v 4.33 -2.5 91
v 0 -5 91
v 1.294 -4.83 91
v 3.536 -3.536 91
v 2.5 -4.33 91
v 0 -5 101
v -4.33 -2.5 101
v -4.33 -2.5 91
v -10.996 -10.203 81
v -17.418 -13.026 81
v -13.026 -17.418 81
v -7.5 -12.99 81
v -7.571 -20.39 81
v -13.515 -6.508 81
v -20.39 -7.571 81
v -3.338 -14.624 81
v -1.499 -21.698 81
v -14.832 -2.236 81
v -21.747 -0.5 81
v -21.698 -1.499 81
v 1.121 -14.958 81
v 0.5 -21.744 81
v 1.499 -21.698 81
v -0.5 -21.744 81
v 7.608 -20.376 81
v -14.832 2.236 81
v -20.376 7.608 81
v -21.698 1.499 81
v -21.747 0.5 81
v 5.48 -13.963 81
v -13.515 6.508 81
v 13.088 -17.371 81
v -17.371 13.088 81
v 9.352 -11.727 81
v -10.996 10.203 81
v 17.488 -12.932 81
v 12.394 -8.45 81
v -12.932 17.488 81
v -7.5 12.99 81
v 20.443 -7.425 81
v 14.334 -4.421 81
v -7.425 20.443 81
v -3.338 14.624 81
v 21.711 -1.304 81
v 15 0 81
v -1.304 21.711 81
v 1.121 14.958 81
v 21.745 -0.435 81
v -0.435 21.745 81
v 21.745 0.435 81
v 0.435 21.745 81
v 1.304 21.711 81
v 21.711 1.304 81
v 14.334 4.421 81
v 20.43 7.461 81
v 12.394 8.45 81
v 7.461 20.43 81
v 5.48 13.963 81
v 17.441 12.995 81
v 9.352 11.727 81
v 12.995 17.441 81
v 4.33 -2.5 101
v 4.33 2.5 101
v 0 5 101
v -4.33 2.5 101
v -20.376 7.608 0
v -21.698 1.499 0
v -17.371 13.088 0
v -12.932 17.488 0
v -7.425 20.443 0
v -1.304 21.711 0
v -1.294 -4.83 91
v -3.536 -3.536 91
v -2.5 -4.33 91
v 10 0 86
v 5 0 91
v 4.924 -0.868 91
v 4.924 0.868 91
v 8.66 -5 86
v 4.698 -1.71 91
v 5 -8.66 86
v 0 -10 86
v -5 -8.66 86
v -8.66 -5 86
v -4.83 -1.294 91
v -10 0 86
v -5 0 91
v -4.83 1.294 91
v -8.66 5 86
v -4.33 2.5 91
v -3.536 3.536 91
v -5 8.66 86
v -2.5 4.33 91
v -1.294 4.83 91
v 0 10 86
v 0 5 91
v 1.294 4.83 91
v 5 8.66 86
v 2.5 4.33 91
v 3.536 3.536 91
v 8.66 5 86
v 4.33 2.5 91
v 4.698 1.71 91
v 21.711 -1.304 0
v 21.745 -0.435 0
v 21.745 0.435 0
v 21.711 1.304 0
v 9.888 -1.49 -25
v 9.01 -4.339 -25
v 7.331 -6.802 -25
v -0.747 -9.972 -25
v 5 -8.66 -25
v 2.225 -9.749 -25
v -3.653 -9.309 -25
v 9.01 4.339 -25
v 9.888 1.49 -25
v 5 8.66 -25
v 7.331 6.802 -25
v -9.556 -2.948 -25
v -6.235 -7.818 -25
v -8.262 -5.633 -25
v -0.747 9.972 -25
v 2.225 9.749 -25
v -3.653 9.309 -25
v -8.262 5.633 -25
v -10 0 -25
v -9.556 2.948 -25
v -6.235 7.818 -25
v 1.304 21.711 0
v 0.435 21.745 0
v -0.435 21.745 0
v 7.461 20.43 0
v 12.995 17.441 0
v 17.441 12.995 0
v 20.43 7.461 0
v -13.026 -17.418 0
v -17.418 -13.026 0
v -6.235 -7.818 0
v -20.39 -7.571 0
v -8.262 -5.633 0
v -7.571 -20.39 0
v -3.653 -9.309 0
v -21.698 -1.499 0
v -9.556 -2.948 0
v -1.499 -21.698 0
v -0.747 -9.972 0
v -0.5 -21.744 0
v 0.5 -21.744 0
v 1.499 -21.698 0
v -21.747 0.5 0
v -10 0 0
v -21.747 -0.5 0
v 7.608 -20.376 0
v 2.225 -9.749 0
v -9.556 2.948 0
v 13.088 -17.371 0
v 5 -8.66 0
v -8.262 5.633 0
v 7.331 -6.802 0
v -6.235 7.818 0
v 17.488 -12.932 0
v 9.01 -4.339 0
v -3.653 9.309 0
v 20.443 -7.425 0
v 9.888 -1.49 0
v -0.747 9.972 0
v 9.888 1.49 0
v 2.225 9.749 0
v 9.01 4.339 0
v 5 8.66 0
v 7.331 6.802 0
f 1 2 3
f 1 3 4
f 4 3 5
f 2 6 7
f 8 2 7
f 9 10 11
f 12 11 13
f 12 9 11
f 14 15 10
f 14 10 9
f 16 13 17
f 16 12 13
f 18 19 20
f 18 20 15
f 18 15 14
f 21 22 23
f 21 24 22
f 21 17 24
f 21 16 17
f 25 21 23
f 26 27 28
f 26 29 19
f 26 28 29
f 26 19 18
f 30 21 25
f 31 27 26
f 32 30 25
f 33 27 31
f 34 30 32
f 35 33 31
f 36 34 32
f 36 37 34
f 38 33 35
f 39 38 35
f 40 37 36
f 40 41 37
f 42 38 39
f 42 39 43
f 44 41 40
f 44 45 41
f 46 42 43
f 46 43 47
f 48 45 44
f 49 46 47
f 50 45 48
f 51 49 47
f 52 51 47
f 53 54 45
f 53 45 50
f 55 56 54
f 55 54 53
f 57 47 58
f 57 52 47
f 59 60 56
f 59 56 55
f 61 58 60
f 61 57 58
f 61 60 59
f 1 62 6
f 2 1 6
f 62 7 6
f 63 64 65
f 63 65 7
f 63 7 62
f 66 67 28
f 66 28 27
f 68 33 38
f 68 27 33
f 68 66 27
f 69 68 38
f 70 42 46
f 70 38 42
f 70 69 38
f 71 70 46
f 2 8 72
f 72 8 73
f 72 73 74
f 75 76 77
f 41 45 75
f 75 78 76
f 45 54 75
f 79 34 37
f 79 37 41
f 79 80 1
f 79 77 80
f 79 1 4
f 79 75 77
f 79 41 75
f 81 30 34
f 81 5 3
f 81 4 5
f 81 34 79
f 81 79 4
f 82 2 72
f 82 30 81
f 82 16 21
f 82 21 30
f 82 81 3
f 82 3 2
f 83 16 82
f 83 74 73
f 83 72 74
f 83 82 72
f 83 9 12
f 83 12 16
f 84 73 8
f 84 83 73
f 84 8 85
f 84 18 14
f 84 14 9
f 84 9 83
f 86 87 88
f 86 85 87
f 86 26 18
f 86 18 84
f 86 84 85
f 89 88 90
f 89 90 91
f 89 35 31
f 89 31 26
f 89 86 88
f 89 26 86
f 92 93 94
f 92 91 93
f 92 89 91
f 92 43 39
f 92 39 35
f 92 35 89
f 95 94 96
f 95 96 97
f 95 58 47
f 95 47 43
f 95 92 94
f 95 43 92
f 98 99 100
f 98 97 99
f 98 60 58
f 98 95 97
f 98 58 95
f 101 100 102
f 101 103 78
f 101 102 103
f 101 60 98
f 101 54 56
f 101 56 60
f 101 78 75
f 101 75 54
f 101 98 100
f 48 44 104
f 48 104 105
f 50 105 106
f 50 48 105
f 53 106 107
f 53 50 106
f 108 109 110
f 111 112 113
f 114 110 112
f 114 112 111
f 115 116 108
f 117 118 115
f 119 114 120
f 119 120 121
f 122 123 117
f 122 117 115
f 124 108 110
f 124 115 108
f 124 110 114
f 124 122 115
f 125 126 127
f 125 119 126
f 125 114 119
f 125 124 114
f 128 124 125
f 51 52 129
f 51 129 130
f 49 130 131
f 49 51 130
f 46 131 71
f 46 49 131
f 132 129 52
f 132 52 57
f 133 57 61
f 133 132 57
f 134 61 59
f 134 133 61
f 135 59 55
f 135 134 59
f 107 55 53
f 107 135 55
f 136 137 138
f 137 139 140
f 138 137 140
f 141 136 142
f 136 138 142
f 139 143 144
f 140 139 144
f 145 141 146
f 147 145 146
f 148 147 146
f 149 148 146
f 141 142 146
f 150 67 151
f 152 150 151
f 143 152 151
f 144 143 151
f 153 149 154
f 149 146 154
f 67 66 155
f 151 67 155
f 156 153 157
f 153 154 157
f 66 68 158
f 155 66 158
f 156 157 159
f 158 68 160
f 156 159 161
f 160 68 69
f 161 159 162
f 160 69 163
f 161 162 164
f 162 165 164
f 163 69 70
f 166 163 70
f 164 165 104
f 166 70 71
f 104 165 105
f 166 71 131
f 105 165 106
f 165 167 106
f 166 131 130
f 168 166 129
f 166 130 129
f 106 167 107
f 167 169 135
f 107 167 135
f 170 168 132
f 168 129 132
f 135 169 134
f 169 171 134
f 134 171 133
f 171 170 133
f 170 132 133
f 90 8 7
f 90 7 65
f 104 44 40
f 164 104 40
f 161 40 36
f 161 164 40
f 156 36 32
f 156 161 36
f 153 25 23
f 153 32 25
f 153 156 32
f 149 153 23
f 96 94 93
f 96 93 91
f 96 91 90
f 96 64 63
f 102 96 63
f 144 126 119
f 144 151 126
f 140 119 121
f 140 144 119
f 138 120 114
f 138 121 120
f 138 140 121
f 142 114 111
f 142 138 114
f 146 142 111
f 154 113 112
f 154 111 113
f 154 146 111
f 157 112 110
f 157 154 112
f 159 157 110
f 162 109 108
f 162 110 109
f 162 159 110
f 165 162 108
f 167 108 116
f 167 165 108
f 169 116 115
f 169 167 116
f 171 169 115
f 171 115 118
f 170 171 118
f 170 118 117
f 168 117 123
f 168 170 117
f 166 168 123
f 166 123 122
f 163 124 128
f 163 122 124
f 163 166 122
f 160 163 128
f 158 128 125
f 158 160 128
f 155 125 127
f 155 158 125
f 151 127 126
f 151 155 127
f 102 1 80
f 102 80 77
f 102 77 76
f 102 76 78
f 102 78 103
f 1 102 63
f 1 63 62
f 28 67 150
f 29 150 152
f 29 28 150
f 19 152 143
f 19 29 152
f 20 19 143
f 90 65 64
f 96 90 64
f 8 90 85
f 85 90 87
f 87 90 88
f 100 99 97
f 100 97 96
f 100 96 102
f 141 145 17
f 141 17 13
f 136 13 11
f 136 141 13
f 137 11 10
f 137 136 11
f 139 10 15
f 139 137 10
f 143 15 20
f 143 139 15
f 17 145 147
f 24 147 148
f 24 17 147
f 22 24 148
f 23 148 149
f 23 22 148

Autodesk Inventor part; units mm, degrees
ref_plane "YZ Plane" through (0, 0, 0) normal (1, 0, 0) x (0, 1, 0)
ref_plane "XZ Plane" through (0, 0, 0) normal (0, 1, 0) x (-1, 0, 0)
ref_plane "XY Plane" through (0, 0, 0) normal (0, 0, 1) x (1, 0, 0)
sketch "Boceto1" plane through (0, 0, 0) normal (0, 0, 1) x (1, 0, 0)
  circle A0 centre (0, 0) radius 21.75
  arc A1 (1.304413, 21.71085) -> (0, 23.055) centre (0, 21.75) ccw
  arc A2 (0, 23.055) -> (-1.304413, 21.71085) centre (0, 21.75) ccw
  line L0 (0, -21.75) -> (0, -23.25)
  arc A3 (0, -23.25) -> (1.499108, -21.698276) centre (0, -21.75) ccw
  arc A4 (-1.499108, -21.698276) -> (0, -23.25) centre (0, -21.75) ccw
  line L1 (21.75, 0) -> (23.055, 0)
  line L2 (-21.75, 0) -> (-23.25, 0)
  arc A5 (-21.698276, 1.499108) -> (-21.698276, -1.499108) centre (-21.75, 0) ccw
  arc A6 (21.71085, -1.304413) -> (21.71085, 1.304413) centre (21.75, 0) ccw
  dimension "d0" = 43.5
  dimension "d2" = 1.5
  dimension "d4" = 1.5
extrude "Extrusión1" add sketch "Boceto1" along normal blind 81
sketch "Boceto2" plane through (0, 0, 81) normal (0, 0, 1) x (1, 0, 0)
  line L0 (0, 5) -> (4.330127, 2.5)
  line L1 (4.330127, 2.5) -> (4.330127, -2.5)
  line L2 (4.330127, -2.5) -> (0, -5)
  line L3 (0, -5) -> (-4.330127, -2.5)
  line L4 (-4.330127, -2.5) -> (-4.330127, 2.5)
  line L5 (-4.330127, 2.5) -> (0, 5)
  point P0 (0, 0)
  point P1 (0, 0)
extrude "Extrusión2" add sketch "Boceto2" along normal blind 20
sketch "Boceto10" plane through (0, 0, 0) normal (0, 0, -1) x (-1, 0, 0)
  circle A0 centre (0, 0) radius 7.5
  dimension "d37" = 15
extrude "Extrusión9" add sketch "Boceto10" along normal blind 25
sketch "Boceto12" plane through (0, 0, 0) normal (0, 0, -1) x (-1, 0, 0)
  circle A0 centre (0, 0) radius 10
  dimension "d40" = 20
extrude "Extrusión10" add sketch "Boceto12" along normal blind 25
sketch "Boceto20" plane through (0, 0, 81) normal (0, 0, 1) x (1, 0, 0)
  circle A0 centre (0, 0) radius 15
  dimension "d61" = 30
ref_plane "Plano de trabajo1" through (0, 0, 91) normal (0, 0, 1) x (1, 0, 0)
sketch "Boceto21" plane through (0, 0, 91) normal (0, 0, 1) x (1, 0, 0)
  line L0 (4.330127, 2.5) -> (4.330127, -2.5)
  circle A0 centre (0, 0) radius 5
sketch "Boceto20 outline for Solevación1" plane through (0, 0, 81) normal (0, 0, 1) x (1, 0, 0)
  circle A0 centre (0, 0) radius 15
sketch "Boceto21 outline for Solevación1" plane through (0, 0, 91) normal (0, 0, 1) x (1, 0, 0)
  circle A0 centre (0, 0) radius 5
loft "Solevación1" add profiles "Boceto20 outline for Solevación1", "Boceto21 outline for Solevación1"
sketch "Boceto22" plane through (0, 0, 81) normal (0, 0, 1) x (1, 0, 0)
  arc A0 (1.304413, 21.71085) -> (-1.304413, 21.71085) centre (0, 21.75) ccw
  arc A1 (1.304413, 21.71085) -> (-1.304413, 21.71085) centre (0, 21.749554) ccw
  arc A2 (21.71085, -1.304413) -> (21.71085, 1.304413) centre (21.75, 0) ccw
  arc A3 (21.71085, -1.304413) -> (21.71085, 1.304413) centre (21.749554, 0) ccw
  arc A4 (-1.499108, -21.698276) -> (1.499108, -21.698276) centre (0, -21.75) ccw
  arc A5 (-1.499108, -21.698276) -> (1.499108, -21.698276) centre (0, -21.749411) ccw
  arc A6 (-21.698276, 1.499108) -> (-21.698276, -1.499108) centre (-21.75, 0) ccw
  arc A7 (-21.685394, 1.49099) -> (-21.698276, -1.499108) centre (-21.753079, -0.003795) ccw
  arc A8 (-21.698276, 1.499108) -> (-21.698276, -1.499108) centre (-1.222086, 0) ccw
  arc A9 (1.304413, 21.71085) -> (-1.304413, 21.71085) centre (0, -0.250446) ccw
  arc A10 (21.71085, -1.304413) -> (21.71085, 1.304413) centre (-0.250446, 0) ccw
  arc A11 (-1.499108, -21.698276) -> (1.499108, -21.698276) centre (0, 0.250589) ccw
  point P0 (0, 0)
sketch "Boceto22 outline for Extrusión16" plane through (0, 0, 81) normal (0, 0, 1) x (1, 0, 0)
  arc A0 (-1.304413, 21.71085) -> (1.304413, 21.71085) centre (0, -0.250446) cw
  arc A1 (1.304413, 21.71085) -> (-1.304413, 21.71085) centre (0, 21.75) ccw
  arc A2 (21.71085, 1.304413) -> (21.71085, -1.304413) centre (-0.250446, 0) cw
  arc A3 (21.71085, -1.304413) -> (21.71085, 1.304413) centre (21.75, 0) ccw
  arc A4 (-21.698276, -1.499108) -> (-21.698276, 1.499108) centre (-1.222086, 0) cw
  arc A5 (-21.698276, 1.499108) -> (-21.698276, -1.499108) centre (-21.75, 0) ccw
  arc A6 (1.499108, -21.698276) -> (-1.499108, -21.698276) centre (0, 0.250589) cw
  arc A7 (-1.499108, -21.698276) -> (1.499108, -21.698276) centre (0, -21.75) ccw
extrude "Extrusión16" cut sketch "Boceto22 outline for Extrusión16" against normal blind 211
properties part number "eix bobina"
